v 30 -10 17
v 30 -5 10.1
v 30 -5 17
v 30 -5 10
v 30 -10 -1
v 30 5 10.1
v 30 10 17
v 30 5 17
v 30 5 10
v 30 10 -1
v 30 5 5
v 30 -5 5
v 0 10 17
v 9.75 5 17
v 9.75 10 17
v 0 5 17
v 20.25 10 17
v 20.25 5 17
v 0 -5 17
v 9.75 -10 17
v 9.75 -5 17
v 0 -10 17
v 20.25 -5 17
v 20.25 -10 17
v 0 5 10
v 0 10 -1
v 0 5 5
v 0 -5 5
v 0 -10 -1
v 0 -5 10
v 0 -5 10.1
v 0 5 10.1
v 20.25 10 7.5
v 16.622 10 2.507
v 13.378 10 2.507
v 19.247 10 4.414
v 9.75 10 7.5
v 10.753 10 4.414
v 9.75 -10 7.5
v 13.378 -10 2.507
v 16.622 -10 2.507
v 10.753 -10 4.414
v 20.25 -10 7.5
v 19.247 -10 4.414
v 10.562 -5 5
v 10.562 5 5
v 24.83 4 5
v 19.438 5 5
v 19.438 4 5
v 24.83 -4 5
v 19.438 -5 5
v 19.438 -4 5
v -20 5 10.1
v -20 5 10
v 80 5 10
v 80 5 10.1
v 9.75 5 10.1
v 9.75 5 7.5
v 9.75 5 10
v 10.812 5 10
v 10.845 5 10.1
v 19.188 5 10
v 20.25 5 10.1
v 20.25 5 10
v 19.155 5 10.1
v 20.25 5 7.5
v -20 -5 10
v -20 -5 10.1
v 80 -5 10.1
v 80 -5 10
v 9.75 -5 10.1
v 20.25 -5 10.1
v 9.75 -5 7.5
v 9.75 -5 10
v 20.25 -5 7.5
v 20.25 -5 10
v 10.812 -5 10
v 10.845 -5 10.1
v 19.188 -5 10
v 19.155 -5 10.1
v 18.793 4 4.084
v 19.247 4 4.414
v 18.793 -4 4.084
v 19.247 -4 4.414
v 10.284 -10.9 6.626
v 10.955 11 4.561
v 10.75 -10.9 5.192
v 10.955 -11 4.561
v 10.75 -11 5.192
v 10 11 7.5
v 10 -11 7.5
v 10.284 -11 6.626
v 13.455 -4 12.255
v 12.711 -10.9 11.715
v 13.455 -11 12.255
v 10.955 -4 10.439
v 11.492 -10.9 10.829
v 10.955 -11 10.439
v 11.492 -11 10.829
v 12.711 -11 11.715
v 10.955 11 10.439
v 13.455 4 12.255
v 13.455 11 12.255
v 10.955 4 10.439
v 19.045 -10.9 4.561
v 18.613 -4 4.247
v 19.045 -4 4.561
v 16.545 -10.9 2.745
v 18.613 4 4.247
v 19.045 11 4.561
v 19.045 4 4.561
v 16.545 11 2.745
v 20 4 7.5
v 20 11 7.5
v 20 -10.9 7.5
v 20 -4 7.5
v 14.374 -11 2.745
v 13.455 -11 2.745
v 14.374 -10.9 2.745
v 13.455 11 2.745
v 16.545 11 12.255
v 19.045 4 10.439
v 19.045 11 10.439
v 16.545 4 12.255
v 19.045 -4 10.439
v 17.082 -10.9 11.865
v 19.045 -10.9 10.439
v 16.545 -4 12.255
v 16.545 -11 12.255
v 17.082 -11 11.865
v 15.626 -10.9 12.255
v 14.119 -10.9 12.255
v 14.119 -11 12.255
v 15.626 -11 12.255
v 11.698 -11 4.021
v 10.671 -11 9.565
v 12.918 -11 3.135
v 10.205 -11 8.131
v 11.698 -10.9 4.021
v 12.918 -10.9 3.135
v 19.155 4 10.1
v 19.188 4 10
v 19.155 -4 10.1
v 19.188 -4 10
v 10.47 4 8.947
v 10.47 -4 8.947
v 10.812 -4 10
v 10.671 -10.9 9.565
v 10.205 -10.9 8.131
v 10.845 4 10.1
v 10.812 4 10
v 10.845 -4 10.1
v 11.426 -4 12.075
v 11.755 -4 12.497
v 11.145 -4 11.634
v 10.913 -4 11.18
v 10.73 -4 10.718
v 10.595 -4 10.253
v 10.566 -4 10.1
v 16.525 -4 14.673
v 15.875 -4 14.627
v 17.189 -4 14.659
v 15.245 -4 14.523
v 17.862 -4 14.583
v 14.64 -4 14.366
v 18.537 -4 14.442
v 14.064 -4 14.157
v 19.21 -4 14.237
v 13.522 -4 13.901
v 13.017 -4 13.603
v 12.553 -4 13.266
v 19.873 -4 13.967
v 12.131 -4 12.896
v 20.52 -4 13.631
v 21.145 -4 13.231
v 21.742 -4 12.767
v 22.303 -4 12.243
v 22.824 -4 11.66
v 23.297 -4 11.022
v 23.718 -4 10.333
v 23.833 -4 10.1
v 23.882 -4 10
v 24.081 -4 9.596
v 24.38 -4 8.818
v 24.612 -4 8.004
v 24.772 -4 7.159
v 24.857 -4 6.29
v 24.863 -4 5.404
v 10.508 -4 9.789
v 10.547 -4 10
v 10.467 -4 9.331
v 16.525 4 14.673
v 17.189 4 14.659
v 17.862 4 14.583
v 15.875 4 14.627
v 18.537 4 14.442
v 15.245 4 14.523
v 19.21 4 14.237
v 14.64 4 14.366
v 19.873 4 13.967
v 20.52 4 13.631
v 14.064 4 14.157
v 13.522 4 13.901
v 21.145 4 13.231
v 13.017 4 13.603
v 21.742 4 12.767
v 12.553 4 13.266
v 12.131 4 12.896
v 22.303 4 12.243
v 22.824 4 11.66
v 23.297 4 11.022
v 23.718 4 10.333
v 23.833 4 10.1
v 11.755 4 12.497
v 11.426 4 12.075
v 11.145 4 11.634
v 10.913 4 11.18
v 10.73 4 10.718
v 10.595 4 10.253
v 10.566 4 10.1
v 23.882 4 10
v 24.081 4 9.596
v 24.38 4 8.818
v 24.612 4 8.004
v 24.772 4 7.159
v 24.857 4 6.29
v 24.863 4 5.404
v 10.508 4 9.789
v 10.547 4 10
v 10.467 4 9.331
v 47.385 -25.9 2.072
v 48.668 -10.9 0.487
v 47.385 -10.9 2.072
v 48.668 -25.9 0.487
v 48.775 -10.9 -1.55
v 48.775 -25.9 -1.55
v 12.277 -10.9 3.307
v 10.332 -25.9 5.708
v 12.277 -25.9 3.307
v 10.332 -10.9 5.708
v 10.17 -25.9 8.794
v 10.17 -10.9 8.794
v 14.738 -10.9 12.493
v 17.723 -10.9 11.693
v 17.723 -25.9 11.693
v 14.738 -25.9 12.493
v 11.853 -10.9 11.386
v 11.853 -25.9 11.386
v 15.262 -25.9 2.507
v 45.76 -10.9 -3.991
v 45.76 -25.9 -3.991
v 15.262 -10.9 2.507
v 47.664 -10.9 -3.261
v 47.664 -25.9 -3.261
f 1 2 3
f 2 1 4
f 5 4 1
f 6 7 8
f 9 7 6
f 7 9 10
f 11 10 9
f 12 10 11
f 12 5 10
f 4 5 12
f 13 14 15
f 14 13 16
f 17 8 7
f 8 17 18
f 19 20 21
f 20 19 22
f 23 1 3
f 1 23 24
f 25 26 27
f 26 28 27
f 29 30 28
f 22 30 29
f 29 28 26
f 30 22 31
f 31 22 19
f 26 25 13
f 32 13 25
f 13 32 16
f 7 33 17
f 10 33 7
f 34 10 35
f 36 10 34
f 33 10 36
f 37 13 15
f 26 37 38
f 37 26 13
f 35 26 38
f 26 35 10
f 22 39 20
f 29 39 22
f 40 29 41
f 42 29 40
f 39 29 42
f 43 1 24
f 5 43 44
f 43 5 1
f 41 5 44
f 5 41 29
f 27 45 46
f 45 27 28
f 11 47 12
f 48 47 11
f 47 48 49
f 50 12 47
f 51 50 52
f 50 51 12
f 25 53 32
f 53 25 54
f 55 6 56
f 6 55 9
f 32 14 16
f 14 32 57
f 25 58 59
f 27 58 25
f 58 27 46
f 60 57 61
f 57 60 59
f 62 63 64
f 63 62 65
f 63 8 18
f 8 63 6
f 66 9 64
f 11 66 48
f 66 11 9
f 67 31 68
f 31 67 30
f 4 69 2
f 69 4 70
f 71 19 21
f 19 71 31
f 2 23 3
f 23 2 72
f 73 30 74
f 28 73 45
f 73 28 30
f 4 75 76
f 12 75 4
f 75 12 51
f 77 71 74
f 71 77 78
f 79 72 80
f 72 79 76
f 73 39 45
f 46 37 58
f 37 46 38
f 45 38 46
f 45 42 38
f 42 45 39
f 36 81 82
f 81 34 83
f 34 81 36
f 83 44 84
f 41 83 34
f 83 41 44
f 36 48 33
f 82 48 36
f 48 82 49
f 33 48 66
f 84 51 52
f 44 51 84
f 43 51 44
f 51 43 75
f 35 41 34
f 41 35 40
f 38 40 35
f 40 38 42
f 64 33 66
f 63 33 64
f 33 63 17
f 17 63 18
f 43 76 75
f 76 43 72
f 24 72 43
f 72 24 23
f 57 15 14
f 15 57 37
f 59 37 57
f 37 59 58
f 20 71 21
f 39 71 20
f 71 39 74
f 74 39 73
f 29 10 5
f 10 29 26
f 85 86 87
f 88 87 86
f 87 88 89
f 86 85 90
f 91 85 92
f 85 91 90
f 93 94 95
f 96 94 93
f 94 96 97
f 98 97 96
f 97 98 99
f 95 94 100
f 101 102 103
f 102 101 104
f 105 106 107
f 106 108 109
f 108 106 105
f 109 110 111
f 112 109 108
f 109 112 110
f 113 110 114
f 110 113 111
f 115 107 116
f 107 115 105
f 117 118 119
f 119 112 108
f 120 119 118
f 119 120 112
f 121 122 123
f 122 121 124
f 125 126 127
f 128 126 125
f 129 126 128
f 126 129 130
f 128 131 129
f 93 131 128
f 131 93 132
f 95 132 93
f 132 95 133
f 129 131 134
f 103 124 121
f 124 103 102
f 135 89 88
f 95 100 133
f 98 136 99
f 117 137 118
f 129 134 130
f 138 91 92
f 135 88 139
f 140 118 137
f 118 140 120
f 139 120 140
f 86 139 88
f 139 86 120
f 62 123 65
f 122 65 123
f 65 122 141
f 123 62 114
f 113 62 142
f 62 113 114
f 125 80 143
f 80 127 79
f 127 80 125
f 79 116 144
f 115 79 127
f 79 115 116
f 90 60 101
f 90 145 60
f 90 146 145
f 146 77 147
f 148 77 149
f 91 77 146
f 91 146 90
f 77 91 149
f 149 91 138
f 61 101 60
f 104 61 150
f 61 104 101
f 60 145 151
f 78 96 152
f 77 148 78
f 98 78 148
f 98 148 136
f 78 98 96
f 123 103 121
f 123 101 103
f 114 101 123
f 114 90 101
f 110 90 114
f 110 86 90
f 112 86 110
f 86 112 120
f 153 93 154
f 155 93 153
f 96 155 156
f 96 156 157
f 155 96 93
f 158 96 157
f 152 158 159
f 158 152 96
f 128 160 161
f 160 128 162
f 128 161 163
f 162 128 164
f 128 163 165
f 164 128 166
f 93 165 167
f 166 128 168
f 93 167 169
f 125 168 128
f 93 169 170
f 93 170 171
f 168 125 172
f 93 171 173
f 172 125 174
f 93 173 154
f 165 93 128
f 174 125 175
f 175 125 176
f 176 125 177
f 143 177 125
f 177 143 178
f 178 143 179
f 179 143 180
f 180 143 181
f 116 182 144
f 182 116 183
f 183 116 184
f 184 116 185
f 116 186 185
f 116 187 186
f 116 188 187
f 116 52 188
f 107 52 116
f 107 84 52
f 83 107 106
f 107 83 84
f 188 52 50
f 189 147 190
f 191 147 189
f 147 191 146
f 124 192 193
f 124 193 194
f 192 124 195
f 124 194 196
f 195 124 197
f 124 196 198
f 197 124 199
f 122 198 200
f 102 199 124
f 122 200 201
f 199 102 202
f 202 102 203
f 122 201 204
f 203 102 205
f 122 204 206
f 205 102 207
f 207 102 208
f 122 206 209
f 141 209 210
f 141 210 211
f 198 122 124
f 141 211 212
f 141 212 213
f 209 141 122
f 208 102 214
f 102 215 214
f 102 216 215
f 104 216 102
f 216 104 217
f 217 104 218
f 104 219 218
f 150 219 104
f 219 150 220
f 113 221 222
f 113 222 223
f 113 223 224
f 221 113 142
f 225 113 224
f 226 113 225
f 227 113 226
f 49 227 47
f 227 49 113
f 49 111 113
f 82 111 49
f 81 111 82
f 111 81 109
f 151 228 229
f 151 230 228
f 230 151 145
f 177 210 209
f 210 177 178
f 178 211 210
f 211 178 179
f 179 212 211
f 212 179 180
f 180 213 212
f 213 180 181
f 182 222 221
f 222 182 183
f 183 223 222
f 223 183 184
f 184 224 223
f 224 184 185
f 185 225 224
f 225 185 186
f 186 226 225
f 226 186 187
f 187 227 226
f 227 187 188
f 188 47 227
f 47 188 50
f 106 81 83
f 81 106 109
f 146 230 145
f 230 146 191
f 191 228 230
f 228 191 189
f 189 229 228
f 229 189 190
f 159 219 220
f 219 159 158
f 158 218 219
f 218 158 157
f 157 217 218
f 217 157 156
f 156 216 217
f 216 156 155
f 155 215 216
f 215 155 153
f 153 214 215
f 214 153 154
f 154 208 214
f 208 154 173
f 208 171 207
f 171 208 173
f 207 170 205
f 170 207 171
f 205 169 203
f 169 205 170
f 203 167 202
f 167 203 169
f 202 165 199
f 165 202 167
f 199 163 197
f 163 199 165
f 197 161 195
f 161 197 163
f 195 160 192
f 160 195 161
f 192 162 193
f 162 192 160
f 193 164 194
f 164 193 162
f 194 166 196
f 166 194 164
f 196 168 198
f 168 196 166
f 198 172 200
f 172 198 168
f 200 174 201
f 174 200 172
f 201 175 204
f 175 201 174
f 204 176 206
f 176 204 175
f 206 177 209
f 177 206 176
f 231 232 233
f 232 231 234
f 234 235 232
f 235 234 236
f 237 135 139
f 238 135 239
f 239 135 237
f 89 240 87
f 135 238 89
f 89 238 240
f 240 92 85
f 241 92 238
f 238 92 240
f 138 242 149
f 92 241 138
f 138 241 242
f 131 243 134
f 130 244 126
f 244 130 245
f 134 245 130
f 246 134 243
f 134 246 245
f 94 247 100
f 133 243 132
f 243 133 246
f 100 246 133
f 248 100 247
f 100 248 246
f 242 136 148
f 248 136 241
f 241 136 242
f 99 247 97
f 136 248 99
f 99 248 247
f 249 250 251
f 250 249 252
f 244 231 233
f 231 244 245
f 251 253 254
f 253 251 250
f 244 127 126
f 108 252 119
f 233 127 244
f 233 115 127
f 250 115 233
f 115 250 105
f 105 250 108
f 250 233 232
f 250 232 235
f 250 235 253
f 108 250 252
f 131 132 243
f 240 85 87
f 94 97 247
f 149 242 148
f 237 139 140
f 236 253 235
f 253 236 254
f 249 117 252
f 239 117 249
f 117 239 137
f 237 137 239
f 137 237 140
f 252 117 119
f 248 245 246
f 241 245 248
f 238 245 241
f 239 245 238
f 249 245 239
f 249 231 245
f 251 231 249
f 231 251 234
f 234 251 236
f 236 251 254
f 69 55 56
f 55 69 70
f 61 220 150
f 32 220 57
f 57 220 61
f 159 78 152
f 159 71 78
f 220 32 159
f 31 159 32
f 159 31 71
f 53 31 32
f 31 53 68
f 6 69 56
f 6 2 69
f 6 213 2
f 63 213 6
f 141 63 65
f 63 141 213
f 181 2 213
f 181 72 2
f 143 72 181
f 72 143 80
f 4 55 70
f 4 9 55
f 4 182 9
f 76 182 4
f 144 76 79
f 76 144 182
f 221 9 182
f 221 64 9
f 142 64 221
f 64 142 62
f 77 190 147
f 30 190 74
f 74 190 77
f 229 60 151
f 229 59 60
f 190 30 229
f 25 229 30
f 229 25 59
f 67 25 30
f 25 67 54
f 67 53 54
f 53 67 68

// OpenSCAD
// a window stopper with rotating wedge
// (all sizes in millimeter)

module window_stopper(

    /* parameters */
    
    // for window
    window_thickness = 10,   // thickness of window frame
    windowsill_dist = 10,        // distance between window and windowsill
    // for window_stopper
    windowsill_adj = 1,     // adjustment for windowsill distance
    stopper_width = 30,     // width of the stopper
    material_thickness = 5,     // material thickness of the stopper
    window_overlap = 7,     // overlap of stopper and window
    axle_dm = 10,       // axle diameter
    axle_clearance = 0.5,       // axle clearance towards bushing
    // for stopper
    wedge_start_r = 0,      // wedge start radius
    wedge_end_r = 11,      // wedge end radius
    wedge_angle = 42,       // start angle of wedge
    lever_depth = 15,       // depth of lever
    lever_length = 40,      // length of lever
    lever_angle = 15,       // start angle of lever
    
) {
    
    $fn = 10;
    
    axle_height =
        material_thickness + (windowsill_dist - material_thickness) / 2;
    
    module window() {
        color("LightSkyBlue")
            translate( [ -20, -window_thickness / 2, windowsill_dist])
                cube( [100, window_thickness, 0.1]);
        }
    
    module stopper_case() {
        case_size = [
            stopper_width,
            window_thickness + material_thickness * 2,
            windowsill_dist + window_overlap
        ];
        
        translate( [0, -case_size.y / 2, 0] )
        difference() {
            cube( case_size );
            axle_bushing = axle_dm + axle_clearance;
            
            translate( [-1, material_thickness, material_thickness] )
                cube( [case_size.x + 2, window_thickness, case_size.z] );
            
            translate( [case_size.x / 2, -1, axle_height] )
                rotate( [-90,0.0])
                    cylinder( d = axle_bushing, h = case_size.y + 2);
            
            translate( [(case_size.x - axle_bushing) / 2, -1, axle_height] )
                cube( [axle_bushing, case_size.y + 2, case_size.z] );
        }
        
        translate( [0, -case_size.y / 2, -windowsill_adj] )
            cube( [case_size.x, case_size.y, windowsill_adj] );
        
        }
    
    module stopper( angle = 0 ) {
        axle_length = window_thickness + material_thickness * 2 + 2;
        
        translate( [stopper_width / 2, -axle_length / 2, axle_height] )
            rotate( [ -90, 0, 0] )
                cylinder( d = axle_dm, h = axle_length );
        
        points = [
            for ( i = [0:5:360] )
                let ( radius = wedge_start_r + (wedge_end_r - wedge_start_r) * i / 360 )
            [ cos(i) * radius, sin(i) * radius ]
        ];
        
//        points = [
//            for ( i = [0:5:360] )
//            [ cos(i) * (wedge_start_r + (wedge_end_r - wedge_start_r) * i / 360), sin(i) * (wedge_start_r + (wedge_end_r - wedge_start_r) * i / 360) ]
//        ];
            
        wedge_width = window_thickness - 2;
            
//            echo(points);
       translate( [stopper_width / 2, -wedge_width / 2, axle_height] )
            rotate( [-90, 0, 0] )
            rotate( [0, 0, wedge_angle + angle] )
            linear_extrude( height = wedge_width )
            polygon(points);
            
        translate( [stopper_width / 2, -axle_length / 2 + 0.1, axle_height] )
            rotate( [0, lever_angle + angle, 0] )
            rotate( [90,0,0])
            linear_extrude( height = lever_depth )
            hull() {
            circle ( d = axle_dm );
            translate( [lever_length - axle_dm / 2 - axle_dm / 3, 0, 0] )
               circle( d = axle_dm * 0.66);
        }
            
        }
    
    window();
    stopper_case();
    stopper();
    
}

window_stopper( /* parameters */ );
